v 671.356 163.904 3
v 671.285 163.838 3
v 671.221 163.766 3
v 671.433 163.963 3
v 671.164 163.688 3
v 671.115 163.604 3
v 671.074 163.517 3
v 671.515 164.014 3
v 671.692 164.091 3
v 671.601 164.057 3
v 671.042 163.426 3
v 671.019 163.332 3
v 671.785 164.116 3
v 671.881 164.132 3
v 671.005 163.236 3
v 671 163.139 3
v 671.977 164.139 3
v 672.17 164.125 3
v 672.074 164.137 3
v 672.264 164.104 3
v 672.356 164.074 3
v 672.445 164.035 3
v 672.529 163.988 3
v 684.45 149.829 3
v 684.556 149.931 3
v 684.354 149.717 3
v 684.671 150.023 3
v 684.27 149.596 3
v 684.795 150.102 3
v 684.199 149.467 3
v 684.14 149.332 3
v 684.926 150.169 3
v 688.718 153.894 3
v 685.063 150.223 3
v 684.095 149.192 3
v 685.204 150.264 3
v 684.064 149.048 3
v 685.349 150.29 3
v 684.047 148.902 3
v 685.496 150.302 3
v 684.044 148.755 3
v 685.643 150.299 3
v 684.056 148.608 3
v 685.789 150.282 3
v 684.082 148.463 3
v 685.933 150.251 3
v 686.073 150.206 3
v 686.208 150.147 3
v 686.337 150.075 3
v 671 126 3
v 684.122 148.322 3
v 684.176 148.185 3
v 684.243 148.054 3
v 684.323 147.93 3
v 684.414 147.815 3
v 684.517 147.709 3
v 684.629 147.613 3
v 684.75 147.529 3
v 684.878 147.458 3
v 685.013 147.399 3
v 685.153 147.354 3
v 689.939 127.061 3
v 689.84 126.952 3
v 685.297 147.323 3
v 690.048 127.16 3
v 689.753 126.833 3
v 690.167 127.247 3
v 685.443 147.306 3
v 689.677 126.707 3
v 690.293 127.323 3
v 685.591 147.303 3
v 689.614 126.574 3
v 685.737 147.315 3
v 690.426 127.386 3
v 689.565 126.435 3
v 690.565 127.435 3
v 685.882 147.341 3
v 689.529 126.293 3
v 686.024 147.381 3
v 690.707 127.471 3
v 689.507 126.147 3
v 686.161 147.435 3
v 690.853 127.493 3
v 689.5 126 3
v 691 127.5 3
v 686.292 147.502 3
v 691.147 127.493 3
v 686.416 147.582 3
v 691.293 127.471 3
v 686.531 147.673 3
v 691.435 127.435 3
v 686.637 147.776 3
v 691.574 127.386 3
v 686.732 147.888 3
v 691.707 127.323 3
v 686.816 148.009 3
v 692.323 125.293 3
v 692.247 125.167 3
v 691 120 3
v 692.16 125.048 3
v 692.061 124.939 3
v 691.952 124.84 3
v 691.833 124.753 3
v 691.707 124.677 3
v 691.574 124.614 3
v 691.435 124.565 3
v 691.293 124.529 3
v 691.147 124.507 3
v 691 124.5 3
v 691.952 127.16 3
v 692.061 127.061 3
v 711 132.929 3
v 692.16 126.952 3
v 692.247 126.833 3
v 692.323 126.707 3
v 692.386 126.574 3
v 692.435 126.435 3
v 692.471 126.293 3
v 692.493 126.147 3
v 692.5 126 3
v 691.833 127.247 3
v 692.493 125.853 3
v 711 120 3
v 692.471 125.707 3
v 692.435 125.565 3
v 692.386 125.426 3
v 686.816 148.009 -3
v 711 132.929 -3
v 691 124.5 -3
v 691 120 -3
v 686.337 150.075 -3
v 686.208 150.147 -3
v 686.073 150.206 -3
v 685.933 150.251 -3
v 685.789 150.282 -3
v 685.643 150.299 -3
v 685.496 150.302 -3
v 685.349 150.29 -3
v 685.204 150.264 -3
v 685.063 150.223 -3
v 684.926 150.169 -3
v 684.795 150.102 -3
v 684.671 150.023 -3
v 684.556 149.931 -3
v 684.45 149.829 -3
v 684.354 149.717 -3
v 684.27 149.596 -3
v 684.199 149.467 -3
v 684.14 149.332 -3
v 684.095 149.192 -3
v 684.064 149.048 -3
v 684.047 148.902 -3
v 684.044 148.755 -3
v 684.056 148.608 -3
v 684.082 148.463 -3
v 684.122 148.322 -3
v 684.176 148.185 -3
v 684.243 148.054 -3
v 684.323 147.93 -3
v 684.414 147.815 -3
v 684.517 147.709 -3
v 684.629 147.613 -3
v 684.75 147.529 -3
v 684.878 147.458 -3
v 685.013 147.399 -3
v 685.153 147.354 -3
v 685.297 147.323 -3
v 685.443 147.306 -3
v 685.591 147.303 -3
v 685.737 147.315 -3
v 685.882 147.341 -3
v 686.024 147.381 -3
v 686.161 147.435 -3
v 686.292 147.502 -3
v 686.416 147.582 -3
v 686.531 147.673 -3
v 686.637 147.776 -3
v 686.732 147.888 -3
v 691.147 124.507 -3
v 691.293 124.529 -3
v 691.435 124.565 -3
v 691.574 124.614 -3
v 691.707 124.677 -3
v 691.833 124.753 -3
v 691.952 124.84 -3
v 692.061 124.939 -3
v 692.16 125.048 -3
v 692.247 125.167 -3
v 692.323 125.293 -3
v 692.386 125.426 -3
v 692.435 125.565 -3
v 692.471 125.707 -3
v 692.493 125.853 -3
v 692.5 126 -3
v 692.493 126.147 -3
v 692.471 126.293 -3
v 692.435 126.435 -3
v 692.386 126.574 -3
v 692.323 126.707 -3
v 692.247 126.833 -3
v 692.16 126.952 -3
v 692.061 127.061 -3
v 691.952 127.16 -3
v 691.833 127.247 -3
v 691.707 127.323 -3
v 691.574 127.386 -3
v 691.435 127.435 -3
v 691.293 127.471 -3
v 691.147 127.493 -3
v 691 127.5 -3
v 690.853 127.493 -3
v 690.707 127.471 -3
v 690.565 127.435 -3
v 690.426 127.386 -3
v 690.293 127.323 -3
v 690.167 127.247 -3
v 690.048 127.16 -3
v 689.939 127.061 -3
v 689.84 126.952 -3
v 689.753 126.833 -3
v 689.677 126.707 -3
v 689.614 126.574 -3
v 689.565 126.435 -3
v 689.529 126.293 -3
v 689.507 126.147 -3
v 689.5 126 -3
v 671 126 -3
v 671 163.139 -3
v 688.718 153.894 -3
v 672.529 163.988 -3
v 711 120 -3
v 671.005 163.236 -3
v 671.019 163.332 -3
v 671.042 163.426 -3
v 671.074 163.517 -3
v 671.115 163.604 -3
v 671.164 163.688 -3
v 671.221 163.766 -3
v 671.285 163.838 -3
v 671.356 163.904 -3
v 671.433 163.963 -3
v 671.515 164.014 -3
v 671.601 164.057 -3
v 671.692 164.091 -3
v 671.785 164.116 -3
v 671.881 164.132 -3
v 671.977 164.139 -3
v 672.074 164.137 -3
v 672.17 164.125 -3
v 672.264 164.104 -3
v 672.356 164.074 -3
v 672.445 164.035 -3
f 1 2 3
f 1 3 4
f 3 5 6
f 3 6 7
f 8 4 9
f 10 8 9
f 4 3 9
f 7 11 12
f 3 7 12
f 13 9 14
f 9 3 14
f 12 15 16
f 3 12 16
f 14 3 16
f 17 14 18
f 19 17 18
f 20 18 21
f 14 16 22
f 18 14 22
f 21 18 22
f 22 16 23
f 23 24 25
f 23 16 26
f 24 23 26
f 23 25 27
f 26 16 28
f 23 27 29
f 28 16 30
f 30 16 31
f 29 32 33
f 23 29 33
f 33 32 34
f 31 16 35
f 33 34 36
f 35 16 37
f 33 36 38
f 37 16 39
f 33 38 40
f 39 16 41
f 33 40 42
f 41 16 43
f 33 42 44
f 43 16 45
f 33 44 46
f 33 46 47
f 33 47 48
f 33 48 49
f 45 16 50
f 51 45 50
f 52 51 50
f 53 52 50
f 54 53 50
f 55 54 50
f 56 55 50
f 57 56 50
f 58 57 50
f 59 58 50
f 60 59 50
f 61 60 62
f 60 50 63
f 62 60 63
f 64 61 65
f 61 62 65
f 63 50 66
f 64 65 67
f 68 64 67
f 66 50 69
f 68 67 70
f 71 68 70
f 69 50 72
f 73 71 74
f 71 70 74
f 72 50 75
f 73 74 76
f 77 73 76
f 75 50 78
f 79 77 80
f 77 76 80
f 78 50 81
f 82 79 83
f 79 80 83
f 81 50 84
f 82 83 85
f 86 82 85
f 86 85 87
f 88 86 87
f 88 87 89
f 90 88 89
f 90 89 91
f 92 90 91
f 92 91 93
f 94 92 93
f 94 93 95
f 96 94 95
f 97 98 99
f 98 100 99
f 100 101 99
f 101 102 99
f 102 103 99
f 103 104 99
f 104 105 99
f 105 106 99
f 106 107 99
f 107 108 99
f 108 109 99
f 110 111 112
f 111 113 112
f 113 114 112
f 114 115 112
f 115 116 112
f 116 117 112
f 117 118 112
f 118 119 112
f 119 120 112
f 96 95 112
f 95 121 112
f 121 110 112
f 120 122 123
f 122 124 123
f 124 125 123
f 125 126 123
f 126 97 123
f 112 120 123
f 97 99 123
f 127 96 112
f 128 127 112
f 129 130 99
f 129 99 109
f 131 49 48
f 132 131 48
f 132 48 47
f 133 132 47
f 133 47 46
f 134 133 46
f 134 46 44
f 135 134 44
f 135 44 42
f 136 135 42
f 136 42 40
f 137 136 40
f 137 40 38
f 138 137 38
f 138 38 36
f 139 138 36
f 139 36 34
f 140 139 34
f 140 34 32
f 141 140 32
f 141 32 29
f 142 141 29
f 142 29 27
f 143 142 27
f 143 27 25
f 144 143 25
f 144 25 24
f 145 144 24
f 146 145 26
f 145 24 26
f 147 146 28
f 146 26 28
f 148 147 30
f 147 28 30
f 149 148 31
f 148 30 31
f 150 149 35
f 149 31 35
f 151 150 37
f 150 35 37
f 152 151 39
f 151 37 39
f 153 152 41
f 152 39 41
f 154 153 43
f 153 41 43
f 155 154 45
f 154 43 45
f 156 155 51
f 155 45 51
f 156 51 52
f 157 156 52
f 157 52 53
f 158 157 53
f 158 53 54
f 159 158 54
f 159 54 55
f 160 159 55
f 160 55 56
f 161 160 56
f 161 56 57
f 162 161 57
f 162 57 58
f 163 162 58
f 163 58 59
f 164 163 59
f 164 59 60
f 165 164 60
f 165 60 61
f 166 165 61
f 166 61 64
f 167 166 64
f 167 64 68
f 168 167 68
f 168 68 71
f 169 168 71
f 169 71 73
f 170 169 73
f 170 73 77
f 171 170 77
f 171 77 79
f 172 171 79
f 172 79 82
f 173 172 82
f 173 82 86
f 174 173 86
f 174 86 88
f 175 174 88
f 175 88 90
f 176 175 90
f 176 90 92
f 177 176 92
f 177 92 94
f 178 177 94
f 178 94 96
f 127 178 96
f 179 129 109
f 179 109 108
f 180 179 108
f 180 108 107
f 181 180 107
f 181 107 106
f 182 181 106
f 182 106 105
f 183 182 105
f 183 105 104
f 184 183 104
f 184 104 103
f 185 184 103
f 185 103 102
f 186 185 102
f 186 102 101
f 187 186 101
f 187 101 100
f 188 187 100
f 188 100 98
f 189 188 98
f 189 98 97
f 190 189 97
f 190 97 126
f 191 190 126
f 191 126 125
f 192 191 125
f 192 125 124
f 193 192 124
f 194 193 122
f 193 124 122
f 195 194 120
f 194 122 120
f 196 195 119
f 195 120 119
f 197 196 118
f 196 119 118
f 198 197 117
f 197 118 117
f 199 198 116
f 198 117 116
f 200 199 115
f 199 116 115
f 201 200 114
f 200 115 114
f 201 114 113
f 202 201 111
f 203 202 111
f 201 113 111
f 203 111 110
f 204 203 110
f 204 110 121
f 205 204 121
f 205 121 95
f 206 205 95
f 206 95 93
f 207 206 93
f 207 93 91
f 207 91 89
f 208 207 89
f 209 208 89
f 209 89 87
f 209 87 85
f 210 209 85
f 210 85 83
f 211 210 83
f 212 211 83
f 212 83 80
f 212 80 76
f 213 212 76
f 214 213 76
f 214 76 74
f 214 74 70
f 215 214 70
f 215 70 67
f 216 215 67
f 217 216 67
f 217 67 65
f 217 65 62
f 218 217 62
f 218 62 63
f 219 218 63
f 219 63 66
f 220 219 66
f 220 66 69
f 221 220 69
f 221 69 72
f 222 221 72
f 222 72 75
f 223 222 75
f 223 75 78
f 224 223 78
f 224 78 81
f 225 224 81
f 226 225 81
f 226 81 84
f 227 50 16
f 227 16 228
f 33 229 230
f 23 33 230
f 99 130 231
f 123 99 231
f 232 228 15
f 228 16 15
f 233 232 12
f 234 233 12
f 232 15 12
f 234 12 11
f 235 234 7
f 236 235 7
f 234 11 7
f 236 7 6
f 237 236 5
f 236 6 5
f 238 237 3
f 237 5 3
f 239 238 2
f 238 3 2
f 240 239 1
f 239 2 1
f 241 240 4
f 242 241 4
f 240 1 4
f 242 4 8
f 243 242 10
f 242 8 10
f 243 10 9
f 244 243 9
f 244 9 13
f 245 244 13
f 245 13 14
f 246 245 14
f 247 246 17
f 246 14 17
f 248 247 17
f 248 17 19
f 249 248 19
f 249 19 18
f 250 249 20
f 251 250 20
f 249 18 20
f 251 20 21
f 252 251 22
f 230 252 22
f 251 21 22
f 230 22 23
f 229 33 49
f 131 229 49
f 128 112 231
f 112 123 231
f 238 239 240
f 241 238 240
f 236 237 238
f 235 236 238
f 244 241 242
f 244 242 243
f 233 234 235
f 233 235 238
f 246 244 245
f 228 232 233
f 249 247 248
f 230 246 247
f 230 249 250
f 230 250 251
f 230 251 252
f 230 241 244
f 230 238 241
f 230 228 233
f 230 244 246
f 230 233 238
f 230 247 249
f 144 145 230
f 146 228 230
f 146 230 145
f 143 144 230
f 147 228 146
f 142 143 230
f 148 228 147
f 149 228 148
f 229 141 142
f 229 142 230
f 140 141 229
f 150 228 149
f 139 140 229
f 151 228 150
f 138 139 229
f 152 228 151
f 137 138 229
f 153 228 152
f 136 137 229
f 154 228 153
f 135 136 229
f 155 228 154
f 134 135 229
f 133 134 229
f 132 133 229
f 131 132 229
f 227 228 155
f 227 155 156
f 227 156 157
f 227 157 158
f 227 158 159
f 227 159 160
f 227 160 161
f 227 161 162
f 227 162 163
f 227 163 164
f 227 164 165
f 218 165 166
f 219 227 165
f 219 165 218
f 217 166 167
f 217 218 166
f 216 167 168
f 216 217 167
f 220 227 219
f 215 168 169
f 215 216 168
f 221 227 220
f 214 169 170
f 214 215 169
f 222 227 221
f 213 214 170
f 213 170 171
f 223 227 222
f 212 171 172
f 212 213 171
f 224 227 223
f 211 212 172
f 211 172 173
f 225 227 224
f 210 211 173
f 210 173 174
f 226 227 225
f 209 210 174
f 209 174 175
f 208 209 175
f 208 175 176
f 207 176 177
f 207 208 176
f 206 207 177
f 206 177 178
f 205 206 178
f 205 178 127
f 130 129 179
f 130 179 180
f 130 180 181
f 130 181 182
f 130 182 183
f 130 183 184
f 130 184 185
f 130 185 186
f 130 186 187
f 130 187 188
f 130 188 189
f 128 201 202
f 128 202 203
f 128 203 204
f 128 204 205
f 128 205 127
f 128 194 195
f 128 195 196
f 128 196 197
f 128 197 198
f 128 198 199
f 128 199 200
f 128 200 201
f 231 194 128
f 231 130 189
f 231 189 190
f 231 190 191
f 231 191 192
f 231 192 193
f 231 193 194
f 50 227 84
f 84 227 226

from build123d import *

# Parameters (mm, degrees)
BOSS_EXTRUDE1_START     = -3
SKETCH1_W               = 20
SKETCH1_H               = 6
BOSS_EXTRUDE1_DEPTH     = 6
BOSS_EXTRUDE2_REACH     = 713.032
SKETCH2_W               = 40
SKETCH2_H               = 6
SKETCH3_R               = 1.5
CUT_EXTRUDE1_DEPTH      = 730.905928511
FILLET1_R               = 1
CUT_EXTRUDE3_DEPTH      = 730.725112263
CUT_EXTRUDE3_DEPTH_BACK = 730.725112263
SKETCH5_R               = 1.5
CUT_EXTRUDE4_DEPTH      = 730.725112263


with BuildPart() as part:
    # Sketch1 → Boss-Extrude1 (new body)
    with BuildSketch(Plane.XY.offset(BOSS_EXTRUDE1_START)):
        with Locations((701, 123)):
            Rectangle(SKETCH1_W, SKETCH1_H)
    extrude(amount=BOSS_EXTRUDE1_DEPTH)

    # Boss-Extrude2: up to this plane
    boss_extrude2_end = Plane(origin=(261.902222158, 420.028150272, 347.5), z_dir=(-0.5291046610932348, -0.8485565730164449, 0))
    # Sketch2 → Boss-Extrude2 (add, up to the surface)
    with BuildSketch(Plane(origin=(0, 126, 0), x_dir=(1, 0, 0), z_dir=(0, 1, 0)), mode=Mode.PRIVATE) as boss_extrude2_sk1:
        with Locations((691, 0)):
            Rectangle(SKETCH2_W, SKETCH2_H)
    boss_extrude2_tool1 = split(extrude(boss_extrude2_sk1.sketch, amount=BOSS_EXTRUDE2_REACH, mode=Mode.PRIVATE), bisect_by=boss_extrude2_end, keep=Keep.BOTH, mode=Mode.PRIVATE)
    add(boss_extrude2_tool1.solids().sort_by_distance((691, 126, 0))[0])

    # Sketch3 → Cut-Extrude1 (cut, through all)
    with BuildSketch(Plane.XY.offset(3)):
        with Locations((691, 126)):
            Circle(SKETCH3_R)
    extrude(amount=-CUT_EXTRUDE1_DEPTH, mode=Mode.SUBTRACT)

    # Fillet1
    fillet1_edges = [part.edges().sort_by_distance(p)[0] for p in [
        (671, 164.941397093, 0),
    ]]
    fillet(fillet1_edges, radius=FILLET1_R)

    # Sketch4 → Cut-Extrude3 (cut, two sides)
    with BuildSketch(Plane.XY.offset(3)) as cut_extrude3_sk:
        Polygon((688.717930776, 153.893648414), (685.54330281, 148.802308976), (711, 132.929169143), (714.174627967, 138.020508582), align=None)
    extrude(amount=CUT_EXTRUDE3_DEPTH, mode=Mode.SUBTRACT)
    extrude(cut_extrude3_sk.sketch, amount=-CUT_EXTRUDE3_DEPTH_BACK, mode=Mode.SUBTRACT)

    # Sketch5 → Cut-Extrude4 (cut, through all)
    with BuildSketch(Plane.XY.offset(3)):
        with Locations((685.54330281, 148.802308976)):
            Circle(SKETCH5_R)
    extrude(amount=-CUT_EXTRUDE4_DEPTH, mode=Mode.SUBTRACT)


solid = part.part
